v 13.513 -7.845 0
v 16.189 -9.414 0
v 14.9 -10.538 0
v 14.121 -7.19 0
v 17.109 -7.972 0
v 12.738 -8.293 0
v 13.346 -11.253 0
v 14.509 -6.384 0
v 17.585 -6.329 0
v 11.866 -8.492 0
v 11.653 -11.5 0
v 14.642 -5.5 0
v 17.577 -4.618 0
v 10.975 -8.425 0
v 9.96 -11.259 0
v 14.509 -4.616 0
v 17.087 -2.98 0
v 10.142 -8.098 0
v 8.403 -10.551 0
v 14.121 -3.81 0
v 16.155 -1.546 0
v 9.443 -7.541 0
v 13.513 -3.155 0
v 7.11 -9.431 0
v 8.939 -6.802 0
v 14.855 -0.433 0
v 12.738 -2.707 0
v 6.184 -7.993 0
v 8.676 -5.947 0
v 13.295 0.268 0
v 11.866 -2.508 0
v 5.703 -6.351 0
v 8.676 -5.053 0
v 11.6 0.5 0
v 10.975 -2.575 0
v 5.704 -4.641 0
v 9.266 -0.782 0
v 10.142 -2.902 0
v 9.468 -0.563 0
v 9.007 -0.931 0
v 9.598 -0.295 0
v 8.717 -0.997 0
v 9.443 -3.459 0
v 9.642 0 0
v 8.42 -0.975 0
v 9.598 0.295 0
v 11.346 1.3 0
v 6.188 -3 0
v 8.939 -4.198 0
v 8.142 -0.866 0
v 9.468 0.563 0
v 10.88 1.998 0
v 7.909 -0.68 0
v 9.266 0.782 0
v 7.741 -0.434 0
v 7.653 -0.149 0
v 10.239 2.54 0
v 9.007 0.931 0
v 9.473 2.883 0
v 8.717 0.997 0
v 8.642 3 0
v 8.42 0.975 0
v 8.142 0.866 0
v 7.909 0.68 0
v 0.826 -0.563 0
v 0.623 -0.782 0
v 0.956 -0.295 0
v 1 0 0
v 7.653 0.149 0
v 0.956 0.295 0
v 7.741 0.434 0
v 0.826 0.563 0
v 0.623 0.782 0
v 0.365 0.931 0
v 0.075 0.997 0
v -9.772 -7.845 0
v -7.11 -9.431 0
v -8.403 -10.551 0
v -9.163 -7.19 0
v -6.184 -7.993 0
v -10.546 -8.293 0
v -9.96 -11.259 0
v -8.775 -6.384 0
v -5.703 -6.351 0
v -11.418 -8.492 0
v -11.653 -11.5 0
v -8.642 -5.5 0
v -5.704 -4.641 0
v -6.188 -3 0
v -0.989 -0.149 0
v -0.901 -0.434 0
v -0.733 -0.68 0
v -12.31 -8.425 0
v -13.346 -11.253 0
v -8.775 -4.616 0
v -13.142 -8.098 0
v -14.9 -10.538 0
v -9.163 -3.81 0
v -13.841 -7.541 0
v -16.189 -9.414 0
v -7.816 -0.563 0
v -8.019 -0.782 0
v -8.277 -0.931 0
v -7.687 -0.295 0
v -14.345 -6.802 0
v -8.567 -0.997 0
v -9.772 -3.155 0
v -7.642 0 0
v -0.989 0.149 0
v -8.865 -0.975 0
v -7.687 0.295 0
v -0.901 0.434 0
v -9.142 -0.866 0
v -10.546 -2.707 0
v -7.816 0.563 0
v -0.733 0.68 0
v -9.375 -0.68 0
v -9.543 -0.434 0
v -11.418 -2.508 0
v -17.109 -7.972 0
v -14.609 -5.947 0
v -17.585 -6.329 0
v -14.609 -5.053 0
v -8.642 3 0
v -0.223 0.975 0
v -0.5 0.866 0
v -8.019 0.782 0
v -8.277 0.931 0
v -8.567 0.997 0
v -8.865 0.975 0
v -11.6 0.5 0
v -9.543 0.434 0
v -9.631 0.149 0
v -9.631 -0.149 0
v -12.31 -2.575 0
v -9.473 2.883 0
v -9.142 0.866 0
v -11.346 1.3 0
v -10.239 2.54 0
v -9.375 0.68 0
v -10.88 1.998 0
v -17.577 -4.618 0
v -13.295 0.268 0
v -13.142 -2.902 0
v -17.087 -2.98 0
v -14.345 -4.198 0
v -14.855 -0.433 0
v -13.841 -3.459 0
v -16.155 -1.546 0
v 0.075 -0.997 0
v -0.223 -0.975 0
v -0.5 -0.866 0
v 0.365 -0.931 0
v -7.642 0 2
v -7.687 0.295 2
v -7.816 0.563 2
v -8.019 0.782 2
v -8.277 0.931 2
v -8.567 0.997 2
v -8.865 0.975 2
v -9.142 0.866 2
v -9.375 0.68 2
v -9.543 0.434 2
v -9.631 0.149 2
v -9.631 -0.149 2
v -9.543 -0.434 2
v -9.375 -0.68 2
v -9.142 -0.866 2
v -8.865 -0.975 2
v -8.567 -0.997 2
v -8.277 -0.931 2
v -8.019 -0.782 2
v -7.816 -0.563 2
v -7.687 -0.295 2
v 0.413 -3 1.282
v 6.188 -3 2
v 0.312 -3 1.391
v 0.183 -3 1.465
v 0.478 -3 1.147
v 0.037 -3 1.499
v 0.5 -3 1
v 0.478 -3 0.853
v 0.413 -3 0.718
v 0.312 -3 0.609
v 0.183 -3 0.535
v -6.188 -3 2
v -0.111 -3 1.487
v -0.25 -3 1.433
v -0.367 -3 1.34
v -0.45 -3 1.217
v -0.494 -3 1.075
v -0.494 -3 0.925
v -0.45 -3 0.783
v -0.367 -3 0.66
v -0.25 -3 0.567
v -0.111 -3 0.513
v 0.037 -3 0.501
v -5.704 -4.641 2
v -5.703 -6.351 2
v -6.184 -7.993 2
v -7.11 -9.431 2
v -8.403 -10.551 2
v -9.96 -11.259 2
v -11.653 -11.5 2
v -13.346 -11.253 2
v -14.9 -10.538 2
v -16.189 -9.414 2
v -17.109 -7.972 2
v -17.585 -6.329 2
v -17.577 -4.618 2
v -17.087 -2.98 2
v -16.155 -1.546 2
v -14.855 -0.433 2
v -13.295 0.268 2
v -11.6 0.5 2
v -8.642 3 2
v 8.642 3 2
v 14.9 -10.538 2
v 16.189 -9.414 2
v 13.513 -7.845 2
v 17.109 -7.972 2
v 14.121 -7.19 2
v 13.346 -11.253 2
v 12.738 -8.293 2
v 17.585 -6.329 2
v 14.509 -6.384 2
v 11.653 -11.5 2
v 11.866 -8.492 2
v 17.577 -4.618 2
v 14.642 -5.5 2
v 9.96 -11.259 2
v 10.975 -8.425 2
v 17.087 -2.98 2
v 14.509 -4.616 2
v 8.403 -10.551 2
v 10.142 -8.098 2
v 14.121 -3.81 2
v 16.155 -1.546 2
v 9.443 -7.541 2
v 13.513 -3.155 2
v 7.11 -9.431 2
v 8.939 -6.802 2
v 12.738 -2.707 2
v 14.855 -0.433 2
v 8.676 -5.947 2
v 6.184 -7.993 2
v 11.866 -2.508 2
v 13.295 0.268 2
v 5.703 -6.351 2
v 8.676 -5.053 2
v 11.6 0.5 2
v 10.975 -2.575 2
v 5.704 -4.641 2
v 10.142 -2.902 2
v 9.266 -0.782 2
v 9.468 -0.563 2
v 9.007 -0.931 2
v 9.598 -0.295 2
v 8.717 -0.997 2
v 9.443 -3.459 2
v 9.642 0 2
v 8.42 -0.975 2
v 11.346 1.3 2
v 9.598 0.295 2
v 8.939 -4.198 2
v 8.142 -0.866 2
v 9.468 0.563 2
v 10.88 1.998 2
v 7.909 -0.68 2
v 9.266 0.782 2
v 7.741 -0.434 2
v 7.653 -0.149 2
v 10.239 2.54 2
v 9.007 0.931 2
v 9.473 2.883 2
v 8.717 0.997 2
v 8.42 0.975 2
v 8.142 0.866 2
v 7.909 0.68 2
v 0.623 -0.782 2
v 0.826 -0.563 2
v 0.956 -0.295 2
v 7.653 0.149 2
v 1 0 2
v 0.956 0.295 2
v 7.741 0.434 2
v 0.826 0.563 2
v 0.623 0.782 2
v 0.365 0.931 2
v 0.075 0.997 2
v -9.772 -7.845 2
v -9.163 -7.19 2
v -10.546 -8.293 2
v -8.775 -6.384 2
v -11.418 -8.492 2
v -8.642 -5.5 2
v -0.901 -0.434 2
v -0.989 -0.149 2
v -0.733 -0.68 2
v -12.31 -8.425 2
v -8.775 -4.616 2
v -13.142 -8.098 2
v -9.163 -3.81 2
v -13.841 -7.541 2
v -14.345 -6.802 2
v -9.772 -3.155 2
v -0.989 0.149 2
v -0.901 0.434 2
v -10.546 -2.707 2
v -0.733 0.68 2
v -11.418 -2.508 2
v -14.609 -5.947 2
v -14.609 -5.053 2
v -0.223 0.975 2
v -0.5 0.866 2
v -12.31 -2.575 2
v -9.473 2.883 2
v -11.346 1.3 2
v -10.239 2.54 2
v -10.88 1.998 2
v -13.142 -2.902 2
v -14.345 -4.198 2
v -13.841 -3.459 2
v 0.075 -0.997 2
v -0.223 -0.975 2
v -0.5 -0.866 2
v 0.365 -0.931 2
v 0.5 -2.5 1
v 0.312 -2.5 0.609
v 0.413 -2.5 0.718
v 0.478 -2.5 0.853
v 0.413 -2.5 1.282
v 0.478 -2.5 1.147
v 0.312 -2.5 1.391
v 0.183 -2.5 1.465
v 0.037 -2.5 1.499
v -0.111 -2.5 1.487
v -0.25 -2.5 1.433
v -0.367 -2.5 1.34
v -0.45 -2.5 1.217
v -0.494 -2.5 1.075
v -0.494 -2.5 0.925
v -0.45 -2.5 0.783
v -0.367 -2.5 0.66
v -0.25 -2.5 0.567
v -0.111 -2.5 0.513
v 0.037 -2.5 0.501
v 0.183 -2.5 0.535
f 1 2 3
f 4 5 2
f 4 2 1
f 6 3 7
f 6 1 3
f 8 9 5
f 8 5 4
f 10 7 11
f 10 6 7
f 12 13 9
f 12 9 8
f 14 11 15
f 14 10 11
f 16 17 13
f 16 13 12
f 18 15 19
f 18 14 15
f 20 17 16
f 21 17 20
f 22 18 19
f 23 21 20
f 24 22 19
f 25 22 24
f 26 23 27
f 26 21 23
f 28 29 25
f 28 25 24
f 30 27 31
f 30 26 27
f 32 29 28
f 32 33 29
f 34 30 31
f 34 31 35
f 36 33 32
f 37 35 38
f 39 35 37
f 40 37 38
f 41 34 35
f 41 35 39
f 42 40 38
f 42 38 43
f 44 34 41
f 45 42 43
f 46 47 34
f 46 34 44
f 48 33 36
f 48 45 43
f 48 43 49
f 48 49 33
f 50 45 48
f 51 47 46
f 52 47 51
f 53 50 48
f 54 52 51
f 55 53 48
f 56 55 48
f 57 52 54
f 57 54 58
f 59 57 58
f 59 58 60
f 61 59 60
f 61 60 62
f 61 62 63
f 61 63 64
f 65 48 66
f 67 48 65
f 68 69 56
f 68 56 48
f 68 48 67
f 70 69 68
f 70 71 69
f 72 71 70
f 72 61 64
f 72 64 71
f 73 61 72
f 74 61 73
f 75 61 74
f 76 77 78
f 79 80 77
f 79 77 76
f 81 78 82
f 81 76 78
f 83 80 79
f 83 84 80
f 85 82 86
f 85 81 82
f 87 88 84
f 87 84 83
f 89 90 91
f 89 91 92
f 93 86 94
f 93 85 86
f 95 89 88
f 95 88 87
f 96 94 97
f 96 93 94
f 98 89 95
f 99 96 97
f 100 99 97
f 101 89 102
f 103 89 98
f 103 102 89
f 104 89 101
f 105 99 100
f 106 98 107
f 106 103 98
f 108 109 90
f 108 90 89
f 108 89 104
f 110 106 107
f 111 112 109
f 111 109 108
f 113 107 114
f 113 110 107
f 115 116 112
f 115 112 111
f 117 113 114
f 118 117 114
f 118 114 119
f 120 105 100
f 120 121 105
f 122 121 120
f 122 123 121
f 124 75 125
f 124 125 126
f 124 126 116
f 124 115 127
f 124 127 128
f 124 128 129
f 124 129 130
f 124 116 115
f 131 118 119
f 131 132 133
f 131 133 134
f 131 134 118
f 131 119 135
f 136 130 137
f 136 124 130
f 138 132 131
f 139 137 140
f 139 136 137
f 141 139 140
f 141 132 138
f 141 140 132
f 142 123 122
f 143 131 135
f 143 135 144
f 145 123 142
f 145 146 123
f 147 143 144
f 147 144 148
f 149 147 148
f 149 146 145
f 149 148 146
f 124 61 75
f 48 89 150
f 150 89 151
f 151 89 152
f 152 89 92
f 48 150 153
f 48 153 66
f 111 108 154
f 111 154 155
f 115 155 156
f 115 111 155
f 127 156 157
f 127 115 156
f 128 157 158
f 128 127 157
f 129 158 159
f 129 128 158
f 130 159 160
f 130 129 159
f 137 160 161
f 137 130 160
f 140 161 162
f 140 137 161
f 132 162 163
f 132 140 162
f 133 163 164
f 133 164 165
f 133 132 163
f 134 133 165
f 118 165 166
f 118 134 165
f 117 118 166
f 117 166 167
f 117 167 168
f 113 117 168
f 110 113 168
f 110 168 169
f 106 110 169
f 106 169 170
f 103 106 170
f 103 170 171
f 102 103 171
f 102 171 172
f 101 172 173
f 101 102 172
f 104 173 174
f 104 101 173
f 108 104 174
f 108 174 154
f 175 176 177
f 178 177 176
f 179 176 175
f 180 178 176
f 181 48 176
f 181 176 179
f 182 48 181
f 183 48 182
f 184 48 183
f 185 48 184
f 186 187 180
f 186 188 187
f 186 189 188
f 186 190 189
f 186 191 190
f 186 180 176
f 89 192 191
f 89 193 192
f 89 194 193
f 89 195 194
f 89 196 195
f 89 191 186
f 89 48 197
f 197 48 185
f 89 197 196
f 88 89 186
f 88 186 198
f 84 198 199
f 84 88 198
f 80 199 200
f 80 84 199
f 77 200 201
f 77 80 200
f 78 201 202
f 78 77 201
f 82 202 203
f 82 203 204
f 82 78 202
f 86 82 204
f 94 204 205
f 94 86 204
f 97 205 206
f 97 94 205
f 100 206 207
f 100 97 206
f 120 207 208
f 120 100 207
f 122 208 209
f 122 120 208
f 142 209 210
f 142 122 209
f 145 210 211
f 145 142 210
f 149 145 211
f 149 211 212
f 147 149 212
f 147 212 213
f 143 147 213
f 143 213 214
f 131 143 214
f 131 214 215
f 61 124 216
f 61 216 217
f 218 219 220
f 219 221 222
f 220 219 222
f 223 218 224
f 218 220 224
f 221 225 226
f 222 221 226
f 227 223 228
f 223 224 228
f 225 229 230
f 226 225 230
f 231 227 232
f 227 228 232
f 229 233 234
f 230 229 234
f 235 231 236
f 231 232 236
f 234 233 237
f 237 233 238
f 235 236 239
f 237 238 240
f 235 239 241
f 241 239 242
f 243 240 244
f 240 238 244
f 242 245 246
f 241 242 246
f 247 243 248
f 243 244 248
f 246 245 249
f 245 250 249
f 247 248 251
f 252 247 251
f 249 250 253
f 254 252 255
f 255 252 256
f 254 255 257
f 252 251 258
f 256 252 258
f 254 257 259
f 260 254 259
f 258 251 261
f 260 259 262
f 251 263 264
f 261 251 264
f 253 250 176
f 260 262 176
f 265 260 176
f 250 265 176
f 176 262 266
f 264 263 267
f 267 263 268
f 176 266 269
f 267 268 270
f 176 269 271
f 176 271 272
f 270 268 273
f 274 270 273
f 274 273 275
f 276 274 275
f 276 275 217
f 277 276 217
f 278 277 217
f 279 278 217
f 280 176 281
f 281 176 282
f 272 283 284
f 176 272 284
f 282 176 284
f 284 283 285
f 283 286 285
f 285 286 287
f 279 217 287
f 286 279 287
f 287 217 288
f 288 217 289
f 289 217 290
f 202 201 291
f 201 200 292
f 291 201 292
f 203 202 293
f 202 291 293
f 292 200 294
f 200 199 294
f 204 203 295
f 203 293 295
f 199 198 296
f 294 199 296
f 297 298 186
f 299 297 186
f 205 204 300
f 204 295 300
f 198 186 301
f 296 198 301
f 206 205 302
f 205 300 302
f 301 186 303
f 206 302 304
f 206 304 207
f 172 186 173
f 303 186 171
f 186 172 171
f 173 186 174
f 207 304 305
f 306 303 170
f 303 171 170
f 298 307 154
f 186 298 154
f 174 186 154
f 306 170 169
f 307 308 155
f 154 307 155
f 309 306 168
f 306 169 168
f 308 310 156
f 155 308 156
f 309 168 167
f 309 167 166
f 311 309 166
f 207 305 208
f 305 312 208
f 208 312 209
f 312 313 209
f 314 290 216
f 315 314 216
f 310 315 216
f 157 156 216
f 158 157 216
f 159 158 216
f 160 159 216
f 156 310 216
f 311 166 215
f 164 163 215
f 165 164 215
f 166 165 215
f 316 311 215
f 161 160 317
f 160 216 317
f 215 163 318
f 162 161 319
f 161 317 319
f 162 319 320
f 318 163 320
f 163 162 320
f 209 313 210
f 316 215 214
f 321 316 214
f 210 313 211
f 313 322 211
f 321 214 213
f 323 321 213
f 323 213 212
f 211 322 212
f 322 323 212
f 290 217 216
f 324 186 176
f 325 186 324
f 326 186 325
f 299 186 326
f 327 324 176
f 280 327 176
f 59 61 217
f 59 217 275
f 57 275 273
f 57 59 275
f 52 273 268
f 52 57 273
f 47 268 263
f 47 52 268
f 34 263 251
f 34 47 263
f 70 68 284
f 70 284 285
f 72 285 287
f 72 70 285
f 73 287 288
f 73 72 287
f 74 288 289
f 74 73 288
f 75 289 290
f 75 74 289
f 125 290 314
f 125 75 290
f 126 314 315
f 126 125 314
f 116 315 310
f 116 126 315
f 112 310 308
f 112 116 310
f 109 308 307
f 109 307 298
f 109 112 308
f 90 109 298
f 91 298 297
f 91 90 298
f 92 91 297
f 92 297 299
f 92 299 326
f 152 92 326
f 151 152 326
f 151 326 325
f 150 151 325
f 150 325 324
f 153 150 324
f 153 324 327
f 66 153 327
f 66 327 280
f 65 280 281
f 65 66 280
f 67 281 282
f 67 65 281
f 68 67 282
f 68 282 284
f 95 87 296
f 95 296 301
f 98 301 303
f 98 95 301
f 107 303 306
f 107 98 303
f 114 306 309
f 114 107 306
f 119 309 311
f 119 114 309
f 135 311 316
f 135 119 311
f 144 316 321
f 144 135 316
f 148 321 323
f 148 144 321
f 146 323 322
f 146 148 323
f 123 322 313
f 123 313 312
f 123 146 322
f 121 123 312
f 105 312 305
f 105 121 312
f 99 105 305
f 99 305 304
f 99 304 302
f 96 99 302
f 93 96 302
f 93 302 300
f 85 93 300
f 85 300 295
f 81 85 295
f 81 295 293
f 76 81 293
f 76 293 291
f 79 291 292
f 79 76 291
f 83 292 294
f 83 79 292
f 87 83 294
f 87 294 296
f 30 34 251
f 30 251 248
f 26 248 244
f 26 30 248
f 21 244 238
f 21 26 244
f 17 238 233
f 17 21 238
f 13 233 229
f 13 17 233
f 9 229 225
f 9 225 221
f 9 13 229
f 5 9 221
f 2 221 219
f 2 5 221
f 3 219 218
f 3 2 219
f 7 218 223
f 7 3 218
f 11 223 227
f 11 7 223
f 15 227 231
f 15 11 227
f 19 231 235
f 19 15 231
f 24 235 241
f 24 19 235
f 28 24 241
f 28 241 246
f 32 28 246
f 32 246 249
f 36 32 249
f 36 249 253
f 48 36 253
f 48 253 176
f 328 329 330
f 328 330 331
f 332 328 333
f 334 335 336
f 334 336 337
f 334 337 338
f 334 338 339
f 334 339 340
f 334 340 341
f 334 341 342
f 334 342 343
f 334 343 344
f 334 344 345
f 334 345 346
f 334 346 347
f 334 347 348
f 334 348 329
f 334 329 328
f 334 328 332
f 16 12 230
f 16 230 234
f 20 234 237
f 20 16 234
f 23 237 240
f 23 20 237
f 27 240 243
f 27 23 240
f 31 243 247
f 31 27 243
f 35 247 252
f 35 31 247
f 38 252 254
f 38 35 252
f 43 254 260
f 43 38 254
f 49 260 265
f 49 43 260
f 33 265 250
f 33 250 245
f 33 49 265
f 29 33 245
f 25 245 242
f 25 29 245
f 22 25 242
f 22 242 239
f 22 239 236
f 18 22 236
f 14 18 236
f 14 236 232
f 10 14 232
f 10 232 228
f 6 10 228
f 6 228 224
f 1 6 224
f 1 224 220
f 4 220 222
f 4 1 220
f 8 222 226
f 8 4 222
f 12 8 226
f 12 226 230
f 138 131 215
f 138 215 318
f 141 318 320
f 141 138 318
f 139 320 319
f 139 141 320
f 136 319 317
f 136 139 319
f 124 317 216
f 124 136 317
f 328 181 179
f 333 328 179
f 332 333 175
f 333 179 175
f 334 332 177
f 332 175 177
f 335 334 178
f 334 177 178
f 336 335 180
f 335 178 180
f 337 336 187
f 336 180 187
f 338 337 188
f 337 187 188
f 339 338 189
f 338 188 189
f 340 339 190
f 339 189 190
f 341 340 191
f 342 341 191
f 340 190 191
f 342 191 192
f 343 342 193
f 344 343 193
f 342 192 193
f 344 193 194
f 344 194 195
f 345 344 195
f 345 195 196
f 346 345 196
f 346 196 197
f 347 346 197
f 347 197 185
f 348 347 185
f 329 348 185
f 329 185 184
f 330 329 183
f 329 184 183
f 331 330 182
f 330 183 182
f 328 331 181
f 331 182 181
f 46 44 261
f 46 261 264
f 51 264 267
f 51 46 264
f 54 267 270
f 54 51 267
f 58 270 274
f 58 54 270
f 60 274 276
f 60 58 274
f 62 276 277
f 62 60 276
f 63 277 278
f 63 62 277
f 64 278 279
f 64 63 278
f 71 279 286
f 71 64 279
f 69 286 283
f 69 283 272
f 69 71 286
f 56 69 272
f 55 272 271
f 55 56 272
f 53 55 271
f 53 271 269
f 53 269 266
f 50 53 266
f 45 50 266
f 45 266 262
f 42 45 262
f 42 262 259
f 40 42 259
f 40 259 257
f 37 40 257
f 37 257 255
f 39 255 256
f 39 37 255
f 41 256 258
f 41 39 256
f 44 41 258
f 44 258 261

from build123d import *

# Parameters (mm, degrees)
SKETCH1_R           = 3
SKETCH1_R_2         = 1
BOSS_EXTRUDE1_DEPTH = 2
SKETCH2_R           = 0.5
CUT_EXTRUDE1_DEPTH  = 0.5


with BuildPart() as part:
    # Sketch1 → Boss-Extrude1 (new body)
    with BuildSketch(Plane.XY):
        with BuildLine():
            Line((-8.642138301, 3), (8.642138301, 3))
            ThreePointArc((8.642138301, 3), (10.578686732, 2.291239877), (11.600202961, 0.49985345))
            ThreePointArc((11.600202961, 0.49985345), (14.900135896, -10.538397729), (6.187782244, -3))
            Line((6.187782244, -3), (-6.187782244, -3))
            ThreePointArc((-6.187782244, -3), (-14.900135896, -10.538397729), (-11.600202961, 0.49985345))
            ThreePointArc((-11.600202961, 0.49985345), (-10.578686732, 2.291239877), (-8.642138301, 3))
        make_face()
        with Locations((-11.642138301, -5.5)):
            Circle(SKETCH1_R, mode=Mode.SUBTRACT)
        with Locations((11.642138301, -5.5)):
            Circle(SKETCH1_R, mode=Mode.SUBTRACT)
        with Locations((8.642138301, 0)):
            Circle(SKETCH1_R_2, mode=Mode.SUBTRACT)
        with Locations((-8.642138301, 0)):
            Circle(SKETCH1_R_2, mode=Mode.SUBTRACT)
        Circle(SKETCH1_R_2, mode=Mode.SUBTRACT)
    extrude(amount=BOSS_EXTRUDE1_DEPTH)

    # Sketch2 → Cut-Extrude1 (cut)
    with BuildSketch(Plane.XZ.offset(3)):
        with Locations((0, 1)):
            Circle(SKETCH2_R)
    extrude(amount=-CUT_EXTRUDE1_DEPTH, mode=Mode.SUBTRACT)


solid = part.part
